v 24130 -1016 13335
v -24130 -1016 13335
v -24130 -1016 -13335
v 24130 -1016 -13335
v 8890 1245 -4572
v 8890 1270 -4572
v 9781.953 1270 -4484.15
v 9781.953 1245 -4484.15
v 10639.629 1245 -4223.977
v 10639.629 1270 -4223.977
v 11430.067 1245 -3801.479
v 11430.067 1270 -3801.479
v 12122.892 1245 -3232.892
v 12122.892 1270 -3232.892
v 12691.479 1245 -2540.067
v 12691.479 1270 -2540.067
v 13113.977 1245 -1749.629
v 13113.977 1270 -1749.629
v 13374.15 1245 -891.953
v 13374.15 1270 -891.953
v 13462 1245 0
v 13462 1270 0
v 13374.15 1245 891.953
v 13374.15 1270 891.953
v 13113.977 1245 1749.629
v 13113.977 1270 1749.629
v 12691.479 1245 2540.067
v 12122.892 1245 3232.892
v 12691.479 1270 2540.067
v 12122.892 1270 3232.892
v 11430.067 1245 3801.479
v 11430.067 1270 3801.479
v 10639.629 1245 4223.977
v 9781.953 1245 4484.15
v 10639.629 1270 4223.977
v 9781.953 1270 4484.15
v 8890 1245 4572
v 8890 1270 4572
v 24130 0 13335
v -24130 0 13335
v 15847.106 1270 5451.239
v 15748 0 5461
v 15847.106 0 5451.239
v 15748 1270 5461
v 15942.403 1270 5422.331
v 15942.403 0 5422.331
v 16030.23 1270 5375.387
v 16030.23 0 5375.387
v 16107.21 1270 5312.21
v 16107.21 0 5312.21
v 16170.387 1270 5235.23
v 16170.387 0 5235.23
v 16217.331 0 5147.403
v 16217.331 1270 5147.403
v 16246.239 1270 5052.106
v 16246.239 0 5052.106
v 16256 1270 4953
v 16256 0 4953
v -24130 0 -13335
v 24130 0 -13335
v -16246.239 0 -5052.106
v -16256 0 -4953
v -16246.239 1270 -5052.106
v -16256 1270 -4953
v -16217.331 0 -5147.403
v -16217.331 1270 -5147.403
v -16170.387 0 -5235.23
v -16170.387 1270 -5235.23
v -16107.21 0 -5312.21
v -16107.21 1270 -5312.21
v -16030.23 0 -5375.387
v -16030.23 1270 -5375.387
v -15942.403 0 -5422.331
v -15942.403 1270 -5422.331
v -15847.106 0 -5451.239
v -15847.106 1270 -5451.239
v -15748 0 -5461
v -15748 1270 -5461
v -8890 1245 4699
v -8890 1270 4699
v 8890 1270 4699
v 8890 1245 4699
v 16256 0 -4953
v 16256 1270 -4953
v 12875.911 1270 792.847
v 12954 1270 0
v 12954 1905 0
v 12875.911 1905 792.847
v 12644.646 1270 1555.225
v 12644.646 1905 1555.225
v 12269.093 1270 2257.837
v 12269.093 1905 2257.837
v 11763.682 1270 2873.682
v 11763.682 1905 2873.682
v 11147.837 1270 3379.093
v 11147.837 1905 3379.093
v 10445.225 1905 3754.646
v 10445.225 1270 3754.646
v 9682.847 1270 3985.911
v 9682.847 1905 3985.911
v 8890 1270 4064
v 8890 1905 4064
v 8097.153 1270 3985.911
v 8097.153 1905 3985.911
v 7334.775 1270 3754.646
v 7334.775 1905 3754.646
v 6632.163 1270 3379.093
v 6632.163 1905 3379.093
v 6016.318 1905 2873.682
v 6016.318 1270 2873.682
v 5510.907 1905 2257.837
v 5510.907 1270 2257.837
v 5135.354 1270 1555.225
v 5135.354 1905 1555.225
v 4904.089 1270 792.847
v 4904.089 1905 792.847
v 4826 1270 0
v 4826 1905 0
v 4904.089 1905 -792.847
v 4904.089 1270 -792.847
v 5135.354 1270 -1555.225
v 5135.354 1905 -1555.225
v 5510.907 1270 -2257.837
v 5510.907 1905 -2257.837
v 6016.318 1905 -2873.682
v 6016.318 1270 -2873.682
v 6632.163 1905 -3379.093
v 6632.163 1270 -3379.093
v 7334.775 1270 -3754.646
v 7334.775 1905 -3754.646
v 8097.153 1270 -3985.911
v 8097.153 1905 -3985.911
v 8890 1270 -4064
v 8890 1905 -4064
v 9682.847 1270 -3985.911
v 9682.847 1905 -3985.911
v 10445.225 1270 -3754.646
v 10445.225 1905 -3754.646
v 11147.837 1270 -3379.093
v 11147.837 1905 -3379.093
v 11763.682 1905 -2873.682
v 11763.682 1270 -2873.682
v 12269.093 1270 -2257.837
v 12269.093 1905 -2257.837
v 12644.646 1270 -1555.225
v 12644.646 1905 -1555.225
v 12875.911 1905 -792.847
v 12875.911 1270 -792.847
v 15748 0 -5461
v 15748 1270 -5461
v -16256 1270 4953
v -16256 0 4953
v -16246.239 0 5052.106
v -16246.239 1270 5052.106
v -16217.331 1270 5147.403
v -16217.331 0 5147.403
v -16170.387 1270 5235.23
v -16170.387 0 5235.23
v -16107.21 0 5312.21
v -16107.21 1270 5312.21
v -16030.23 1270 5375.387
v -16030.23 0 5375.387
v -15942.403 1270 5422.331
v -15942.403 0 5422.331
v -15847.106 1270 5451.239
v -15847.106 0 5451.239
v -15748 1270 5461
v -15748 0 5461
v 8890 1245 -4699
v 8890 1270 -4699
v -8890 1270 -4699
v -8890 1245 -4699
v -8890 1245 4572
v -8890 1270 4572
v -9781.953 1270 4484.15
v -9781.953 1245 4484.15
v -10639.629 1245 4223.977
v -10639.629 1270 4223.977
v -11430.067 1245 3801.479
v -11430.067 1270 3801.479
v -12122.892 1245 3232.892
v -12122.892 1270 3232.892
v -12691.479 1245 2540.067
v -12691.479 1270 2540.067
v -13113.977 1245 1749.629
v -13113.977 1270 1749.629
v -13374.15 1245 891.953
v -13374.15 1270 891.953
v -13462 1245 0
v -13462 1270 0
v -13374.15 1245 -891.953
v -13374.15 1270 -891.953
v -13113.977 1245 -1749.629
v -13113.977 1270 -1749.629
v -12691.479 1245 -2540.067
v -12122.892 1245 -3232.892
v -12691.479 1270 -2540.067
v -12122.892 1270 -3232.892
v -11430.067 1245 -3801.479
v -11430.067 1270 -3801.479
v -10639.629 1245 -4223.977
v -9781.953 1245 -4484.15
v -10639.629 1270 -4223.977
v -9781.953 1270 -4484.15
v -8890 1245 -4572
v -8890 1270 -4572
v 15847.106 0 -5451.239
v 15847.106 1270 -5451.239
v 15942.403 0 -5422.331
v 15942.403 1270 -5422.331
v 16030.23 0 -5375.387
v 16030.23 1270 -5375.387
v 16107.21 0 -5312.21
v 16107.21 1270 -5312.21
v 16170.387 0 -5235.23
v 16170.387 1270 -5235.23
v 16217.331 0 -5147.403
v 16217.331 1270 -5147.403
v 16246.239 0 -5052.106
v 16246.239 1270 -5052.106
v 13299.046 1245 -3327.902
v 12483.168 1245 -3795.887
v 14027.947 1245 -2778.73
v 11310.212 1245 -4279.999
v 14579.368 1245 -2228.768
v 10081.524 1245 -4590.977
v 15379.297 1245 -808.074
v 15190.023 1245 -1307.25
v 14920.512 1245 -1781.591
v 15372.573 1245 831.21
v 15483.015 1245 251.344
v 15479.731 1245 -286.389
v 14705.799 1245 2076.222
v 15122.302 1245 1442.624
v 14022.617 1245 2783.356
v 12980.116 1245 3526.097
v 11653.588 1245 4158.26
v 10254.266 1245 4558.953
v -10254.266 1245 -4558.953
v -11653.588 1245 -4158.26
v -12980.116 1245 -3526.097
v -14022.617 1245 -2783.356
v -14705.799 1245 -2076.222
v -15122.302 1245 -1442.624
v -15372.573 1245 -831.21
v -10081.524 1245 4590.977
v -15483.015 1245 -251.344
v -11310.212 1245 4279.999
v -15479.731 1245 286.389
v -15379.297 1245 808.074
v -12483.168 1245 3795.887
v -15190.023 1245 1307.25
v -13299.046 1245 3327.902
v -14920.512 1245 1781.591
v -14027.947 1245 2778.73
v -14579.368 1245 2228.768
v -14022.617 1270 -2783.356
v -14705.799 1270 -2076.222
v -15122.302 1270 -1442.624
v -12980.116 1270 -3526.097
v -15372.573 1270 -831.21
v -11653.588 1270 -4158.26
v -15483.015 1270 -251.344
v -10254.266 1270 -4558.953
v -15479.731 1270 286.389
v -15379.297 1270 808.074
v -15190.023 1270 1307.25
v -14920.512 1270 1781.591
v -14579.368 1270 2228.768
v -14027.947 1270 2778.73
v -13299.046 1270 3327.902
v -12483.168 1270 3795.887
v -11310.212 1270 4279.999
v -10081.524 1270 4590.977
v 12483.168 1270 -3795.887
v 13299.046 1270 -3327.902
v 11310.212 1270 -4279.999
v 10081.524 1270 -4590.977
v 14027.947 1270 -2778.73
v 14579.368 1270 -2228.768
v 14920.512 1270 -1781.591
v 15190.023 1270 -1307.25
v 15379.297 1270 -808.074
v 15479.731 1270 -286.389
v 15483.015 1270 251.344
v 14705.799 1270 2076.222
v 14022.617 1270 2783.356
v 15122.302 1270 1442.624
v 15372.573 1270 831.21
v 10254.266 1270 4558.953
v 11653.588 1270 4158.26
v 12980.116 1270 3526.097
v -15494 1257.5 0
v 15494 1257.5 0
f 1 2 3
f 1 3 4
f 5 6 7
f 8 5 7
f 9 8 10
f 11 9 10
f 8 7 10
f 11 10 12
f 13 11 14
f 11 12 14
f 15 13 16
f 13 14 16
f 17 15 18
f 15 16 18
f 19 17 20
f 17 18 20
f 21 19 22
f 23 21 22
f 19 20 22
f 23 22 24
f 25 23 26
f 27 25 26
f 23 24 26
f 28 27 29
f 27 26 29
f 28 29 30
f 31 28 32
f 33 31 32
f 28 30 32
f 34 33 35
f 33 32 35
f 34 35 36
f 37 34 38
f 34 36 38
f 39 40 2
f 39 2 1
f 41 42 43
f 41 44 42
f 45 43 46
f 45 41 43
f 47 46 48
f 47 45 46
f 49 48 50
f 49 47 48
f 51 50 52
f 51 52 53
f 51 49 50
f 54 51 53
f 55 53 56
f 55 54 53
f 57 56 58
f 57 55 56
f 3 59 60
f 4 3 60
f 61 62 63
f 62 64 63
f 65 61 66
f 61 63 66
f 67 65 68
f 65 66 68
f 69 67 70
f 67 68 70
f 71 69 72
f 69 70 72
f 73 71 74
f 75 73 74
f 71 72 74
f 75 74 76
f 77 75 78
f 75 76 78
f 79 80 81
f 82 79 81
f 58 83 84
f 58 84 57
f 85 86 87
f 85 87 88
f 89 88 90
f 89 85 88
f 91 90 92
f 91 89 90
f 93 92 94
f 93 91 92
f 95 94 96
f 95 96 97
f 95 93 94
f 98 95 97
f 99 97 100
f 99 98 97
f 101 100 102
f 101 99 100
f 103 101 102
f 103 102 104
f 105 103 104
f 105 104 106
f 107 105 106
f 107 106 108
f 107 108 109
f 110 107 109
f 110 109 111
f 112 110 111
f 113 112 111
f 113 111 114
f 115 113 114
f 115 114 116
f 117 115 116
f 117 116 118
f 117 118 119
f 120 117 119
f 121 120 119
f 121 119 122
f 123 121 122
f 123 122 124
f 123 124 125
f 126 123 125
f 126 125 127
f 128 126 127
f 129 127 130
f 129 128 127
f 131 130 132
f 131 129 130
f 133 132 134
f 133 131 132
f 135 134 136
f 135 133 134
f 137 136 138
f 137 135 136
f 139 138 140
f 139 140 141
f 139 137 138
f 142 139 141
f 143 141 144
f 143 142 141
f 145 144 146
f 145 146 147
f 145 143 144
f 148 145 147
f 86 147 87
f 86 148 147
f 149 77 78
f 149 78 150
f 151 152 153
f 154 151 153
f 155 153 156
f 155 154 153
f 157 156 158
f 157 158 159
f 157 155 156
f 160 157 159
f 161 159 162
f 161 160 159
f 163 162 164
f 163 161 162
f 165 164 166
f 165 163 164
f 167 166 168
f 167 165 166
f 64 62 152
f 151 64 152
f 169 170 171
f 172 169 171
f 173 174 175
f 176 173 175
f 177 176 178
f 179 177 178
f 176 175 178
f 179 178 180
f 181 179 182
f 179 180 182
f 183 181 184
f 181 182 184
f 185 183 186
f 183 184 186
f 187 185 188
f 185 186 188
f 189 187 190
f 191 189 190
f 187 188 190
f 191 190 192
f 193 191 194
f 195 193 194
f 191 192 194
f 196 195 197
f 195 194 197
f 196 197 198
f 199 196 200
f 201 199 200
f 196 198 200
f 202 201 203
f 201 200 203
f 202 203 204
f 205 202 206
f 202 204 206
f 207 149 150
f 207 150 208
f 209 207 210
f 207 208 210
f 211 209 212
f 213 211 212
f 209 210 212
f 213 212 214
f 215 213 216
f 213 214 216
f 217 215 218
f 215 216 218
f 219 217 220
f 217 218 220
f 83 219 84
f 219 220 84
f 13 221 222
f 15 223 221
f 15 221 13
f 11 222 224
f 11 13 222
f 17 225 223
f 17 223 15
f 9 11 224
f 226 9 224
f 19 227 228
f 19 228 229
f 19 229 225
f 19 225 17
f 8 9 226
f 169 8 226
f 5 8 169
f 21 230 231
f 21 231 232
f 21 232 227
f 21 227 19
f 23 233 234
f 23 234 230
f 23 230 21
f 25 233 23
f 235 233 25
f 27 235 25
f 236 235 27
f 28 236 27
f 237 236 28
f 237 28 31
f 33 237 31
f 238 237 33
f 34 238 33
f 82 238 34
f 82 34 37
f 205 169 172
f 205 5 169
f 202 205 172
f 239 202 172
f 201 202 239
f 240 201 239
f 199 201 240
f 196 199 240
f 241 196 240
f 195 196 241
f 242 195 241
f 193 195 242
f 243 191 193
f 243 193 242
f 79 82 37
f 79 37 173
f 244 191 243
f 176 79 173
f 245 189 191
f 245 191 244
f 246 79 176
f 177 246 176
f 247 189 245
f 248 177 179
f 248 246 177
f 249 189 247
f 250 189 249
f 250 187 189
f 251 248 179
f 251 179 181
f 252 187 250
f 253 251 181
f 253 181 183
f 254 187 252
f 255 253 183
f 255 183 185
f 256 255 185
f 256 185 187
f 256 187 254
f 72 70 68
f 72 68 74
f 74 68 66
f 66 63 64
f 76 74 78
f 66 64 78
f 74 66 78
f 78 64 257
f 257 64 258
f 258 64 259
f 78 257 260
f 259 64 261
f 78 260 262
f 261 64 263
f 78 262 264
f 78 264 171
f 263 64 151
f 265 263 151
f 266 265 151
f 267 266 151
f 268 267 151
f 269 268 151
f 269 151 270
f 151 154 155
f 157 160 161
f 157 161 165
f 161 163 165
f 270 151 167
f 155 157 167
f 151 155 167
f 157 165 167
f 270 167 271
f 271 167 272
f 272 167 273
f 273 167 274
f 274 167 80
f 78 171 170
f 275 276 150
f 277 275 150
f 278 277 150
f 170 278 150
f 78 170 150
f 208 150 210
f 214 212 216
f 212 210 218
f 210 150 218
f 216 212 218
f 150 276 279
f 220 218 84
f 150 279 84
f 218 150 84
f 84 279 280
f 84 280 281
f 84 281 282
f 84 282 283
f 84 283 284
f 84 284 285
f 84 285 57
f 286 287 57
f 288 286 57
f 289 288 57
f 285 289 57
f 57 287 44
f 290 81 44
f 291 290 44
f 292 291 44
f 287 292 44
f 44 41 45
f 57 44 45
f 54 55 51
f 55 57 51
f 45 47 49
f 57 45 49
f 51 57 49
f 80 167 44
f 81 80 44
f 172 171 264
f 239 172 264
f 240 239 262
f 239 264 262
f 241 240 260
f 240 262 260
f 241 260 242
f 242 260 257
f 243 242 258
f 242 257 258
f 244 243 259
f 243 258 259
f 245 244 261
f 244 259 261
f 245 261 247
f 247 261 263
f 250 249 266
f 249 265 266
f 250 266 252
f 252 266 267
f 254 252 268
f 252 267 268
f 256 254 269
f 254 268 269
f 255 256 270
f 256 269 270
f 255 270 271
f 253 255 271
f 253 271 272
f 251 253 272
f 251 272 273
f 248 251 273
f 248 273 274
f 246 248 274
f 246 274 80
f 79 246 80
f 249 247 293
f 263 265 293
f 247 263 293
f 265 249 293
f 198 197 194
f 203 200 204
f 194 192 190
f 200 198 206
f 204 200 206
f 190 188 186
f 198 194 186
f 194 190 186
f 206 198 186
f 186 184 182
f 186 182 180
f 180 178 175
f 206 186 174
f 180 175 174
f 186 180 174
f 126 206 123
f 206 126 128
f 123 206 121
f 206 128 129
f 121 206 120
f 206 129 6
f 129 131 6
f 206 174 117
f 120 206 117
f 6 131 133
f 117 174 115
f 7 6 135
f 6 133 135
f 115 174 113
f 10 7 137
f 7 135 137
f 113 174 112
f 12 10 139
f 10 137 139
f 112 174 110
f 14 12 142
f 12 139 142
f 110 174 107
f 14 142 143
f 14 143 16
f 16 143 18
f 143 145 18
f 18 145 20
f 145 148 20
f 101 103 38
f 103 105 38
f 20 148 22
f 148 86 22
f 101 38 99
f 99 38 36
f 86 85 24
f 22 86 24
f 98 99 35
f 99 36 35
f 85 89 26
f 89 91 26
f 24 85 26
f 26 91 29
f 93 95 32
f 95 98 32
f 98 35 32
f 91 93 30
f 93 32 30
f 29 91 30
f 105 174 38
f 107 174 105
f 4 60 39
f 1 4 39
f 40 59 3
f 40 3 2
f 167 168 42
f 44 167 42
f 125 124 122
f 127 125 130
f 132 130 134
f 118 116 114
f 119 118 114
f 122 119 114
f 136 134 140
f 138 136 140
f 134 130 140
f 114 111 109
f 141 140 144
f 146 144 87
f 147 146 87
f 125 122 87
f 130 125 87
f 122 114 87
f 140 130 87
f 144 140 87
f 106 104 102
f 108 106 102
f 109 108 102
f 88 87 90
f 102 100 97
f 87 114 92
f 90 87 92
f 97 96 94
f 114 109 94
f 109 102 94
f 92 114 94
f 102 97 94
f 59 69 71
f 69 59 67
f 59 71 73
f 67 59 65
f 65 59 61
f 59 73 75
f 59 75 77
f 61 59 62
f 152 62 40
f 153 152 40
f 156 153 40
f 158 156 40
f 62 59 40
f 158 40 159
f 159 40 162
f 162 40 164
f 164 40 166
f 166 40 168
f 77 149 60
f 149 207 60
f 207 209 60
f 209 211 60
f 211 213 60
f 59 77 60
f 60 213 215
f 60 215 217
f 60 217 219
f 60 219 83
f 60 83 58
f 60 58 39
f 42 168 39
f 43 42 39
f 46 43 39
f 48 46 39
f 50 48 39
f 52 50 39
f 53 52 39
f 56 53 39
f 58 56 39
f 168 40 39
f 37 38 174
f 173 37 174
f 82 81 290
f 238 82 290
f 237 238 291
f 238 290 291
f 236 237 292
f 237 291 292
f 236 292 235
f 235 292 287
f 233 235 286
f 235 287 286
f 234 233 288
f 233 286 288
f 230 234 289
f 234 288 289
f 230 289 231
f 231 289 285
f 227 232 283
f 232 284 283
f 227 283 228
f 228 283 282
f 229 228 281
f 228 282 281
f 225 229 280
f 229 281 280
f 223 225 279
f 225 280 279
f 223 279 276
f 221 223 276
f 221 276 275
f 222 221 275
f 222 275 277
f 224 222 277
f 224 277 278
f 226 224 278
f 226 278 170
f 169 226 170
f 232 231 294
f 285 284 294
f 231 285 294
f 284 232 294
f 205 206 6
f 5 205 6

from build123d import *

# Parameters (mm, degrees)
F0_W     = 48260
F0_H     = 26670
F0_W_2   = 32512
F0_H_2   = 10922
F0_W_3   = 30988
F0_H_3   = 9398
F0_R     = 4064
F1_DEPTH = 1016
F2_DEPTH = 1270
F3_DEPTH = 1905
F4_R     = 508
F6_DEPTH = 25


with BuildPart() as f1:
    # F0 (on Front) → F1 (new body)
    with BuildSketch(Plane.XZ):
        Rectangle(F0_W, F0_H)
        Rectangle(F0_W_2, F0_H_2, mode=Mode.SUBTRACT)
        Rectangle(F0_W_2, F0_H_2)
        Rectangle(F0_W_3, F0_H_3, mode=Mode.SUBTRACT)
        Rectangle(F0_W_3, F0_H_3)
        with Locations((8890, 0)):
            Circle(F0_R, mode=Mode.SUBTRACT)
        with Locations((8890, 0)):
            Circle(F0_R)
    extrude(amount=F1_DEPTH)

    # F0 (on Front) → F2 (join)
    with BuildSketch(Plane.XZ):
        Rectangle(F0_W_2, F0_H_2)
        Rectangle(F0_W_3, F0_H_3, mode=Mode.SUBTRACT)
        Rectangle(F0_W_3, F0_H_3)
        with Locations((8890, 0)):
            Circle(F0_R, mode=Mode.SUBTRACT)
    extrude(amount=-F2_DEPTH)

    # F0 (on Front) → F3 (join)
    with BuildSketch(Plane.XZ):
        with Locations((8890, 0)):
            Circle(F0_R)
    extrude(amount=-F3_DEPTH)

    # F4
    f4_edges = [f1.edges().sort_by_distance(p)[0] for p in [
        (16256, 635, -5461),
        (16256, 635, 5461),
        (-16256, 635, -5461),
        (-16256, 635, 5461),
    ]]
    fillet(f4_edges, radius=F4_R)

    # F5 (on face) → F6 (cut)
    with BuildSketch(Plane(origin=(0, 1270, 0), x_dir=(-1, 0, 0), z_dir=(0, 1, 0))):
        with BuildLine():
            Line((8890, 4699), (-8890, 4699))
            add(Edge.make_bspline(
                [(-15494, 0), (-15494, 2701.7158539631), (-11699.5907432682, 4699), (-8890, 4699)],
                knots=[0, 0, 0, 0, 8105.1475618893, 8105.1475618893, 8105.1475618893, 8105.1475618893], degree=3))
            add(Edge.make_bspline(
                [(-15494, 0), (-15494, -2701.7158539631), (-11699.5907432682, -4699), (-8890, -4699)],
                knots=[0, 0, 0, 0, 8105.1475618893, 8105.1475618893, 8105.1475618893, 8105.1475618893], degree=3))
            Line((-8890, -4699), (8890, -4699))
            add(Edge.make_bspline(
                [(15494, 0), (15494, -2701.7158539631), (11699.5907432682, -4699), (8890, -4699)],
                knots=[0, 0, 0, 0, 8105.1475618893, 8105.1475618893, 8105.1475618893, 8105.1475618893], degree=3))
            add(Edge.make_bspline(
                [(15494, 0), (15494, 2701.7158539631), (11699.5907432682, 4699), (8890, 4699)],
                knots=[0, 0, 0, 0, 8105.1475618893, 8105.1475618893, 8105.1475618893, 8105.1475618893], degree=3))
        make_face()
        with BuildLine():
            Line((-8890, 4572), (8890, 4572))
            ThreePointArc((8890, 4572), (13462, 0), (8890, -4572))
            Line((8890, -4572), (-8890, -4572))
            ThreePointArc((-8890, -4572), (-13462, 0), (-8890, 4572))
        make_face(mode=Mode.SUBTRACT)
    extrude(amount=-F6_DEPTH, mode=Mode.SUBTRACT)


solid = f1.part
